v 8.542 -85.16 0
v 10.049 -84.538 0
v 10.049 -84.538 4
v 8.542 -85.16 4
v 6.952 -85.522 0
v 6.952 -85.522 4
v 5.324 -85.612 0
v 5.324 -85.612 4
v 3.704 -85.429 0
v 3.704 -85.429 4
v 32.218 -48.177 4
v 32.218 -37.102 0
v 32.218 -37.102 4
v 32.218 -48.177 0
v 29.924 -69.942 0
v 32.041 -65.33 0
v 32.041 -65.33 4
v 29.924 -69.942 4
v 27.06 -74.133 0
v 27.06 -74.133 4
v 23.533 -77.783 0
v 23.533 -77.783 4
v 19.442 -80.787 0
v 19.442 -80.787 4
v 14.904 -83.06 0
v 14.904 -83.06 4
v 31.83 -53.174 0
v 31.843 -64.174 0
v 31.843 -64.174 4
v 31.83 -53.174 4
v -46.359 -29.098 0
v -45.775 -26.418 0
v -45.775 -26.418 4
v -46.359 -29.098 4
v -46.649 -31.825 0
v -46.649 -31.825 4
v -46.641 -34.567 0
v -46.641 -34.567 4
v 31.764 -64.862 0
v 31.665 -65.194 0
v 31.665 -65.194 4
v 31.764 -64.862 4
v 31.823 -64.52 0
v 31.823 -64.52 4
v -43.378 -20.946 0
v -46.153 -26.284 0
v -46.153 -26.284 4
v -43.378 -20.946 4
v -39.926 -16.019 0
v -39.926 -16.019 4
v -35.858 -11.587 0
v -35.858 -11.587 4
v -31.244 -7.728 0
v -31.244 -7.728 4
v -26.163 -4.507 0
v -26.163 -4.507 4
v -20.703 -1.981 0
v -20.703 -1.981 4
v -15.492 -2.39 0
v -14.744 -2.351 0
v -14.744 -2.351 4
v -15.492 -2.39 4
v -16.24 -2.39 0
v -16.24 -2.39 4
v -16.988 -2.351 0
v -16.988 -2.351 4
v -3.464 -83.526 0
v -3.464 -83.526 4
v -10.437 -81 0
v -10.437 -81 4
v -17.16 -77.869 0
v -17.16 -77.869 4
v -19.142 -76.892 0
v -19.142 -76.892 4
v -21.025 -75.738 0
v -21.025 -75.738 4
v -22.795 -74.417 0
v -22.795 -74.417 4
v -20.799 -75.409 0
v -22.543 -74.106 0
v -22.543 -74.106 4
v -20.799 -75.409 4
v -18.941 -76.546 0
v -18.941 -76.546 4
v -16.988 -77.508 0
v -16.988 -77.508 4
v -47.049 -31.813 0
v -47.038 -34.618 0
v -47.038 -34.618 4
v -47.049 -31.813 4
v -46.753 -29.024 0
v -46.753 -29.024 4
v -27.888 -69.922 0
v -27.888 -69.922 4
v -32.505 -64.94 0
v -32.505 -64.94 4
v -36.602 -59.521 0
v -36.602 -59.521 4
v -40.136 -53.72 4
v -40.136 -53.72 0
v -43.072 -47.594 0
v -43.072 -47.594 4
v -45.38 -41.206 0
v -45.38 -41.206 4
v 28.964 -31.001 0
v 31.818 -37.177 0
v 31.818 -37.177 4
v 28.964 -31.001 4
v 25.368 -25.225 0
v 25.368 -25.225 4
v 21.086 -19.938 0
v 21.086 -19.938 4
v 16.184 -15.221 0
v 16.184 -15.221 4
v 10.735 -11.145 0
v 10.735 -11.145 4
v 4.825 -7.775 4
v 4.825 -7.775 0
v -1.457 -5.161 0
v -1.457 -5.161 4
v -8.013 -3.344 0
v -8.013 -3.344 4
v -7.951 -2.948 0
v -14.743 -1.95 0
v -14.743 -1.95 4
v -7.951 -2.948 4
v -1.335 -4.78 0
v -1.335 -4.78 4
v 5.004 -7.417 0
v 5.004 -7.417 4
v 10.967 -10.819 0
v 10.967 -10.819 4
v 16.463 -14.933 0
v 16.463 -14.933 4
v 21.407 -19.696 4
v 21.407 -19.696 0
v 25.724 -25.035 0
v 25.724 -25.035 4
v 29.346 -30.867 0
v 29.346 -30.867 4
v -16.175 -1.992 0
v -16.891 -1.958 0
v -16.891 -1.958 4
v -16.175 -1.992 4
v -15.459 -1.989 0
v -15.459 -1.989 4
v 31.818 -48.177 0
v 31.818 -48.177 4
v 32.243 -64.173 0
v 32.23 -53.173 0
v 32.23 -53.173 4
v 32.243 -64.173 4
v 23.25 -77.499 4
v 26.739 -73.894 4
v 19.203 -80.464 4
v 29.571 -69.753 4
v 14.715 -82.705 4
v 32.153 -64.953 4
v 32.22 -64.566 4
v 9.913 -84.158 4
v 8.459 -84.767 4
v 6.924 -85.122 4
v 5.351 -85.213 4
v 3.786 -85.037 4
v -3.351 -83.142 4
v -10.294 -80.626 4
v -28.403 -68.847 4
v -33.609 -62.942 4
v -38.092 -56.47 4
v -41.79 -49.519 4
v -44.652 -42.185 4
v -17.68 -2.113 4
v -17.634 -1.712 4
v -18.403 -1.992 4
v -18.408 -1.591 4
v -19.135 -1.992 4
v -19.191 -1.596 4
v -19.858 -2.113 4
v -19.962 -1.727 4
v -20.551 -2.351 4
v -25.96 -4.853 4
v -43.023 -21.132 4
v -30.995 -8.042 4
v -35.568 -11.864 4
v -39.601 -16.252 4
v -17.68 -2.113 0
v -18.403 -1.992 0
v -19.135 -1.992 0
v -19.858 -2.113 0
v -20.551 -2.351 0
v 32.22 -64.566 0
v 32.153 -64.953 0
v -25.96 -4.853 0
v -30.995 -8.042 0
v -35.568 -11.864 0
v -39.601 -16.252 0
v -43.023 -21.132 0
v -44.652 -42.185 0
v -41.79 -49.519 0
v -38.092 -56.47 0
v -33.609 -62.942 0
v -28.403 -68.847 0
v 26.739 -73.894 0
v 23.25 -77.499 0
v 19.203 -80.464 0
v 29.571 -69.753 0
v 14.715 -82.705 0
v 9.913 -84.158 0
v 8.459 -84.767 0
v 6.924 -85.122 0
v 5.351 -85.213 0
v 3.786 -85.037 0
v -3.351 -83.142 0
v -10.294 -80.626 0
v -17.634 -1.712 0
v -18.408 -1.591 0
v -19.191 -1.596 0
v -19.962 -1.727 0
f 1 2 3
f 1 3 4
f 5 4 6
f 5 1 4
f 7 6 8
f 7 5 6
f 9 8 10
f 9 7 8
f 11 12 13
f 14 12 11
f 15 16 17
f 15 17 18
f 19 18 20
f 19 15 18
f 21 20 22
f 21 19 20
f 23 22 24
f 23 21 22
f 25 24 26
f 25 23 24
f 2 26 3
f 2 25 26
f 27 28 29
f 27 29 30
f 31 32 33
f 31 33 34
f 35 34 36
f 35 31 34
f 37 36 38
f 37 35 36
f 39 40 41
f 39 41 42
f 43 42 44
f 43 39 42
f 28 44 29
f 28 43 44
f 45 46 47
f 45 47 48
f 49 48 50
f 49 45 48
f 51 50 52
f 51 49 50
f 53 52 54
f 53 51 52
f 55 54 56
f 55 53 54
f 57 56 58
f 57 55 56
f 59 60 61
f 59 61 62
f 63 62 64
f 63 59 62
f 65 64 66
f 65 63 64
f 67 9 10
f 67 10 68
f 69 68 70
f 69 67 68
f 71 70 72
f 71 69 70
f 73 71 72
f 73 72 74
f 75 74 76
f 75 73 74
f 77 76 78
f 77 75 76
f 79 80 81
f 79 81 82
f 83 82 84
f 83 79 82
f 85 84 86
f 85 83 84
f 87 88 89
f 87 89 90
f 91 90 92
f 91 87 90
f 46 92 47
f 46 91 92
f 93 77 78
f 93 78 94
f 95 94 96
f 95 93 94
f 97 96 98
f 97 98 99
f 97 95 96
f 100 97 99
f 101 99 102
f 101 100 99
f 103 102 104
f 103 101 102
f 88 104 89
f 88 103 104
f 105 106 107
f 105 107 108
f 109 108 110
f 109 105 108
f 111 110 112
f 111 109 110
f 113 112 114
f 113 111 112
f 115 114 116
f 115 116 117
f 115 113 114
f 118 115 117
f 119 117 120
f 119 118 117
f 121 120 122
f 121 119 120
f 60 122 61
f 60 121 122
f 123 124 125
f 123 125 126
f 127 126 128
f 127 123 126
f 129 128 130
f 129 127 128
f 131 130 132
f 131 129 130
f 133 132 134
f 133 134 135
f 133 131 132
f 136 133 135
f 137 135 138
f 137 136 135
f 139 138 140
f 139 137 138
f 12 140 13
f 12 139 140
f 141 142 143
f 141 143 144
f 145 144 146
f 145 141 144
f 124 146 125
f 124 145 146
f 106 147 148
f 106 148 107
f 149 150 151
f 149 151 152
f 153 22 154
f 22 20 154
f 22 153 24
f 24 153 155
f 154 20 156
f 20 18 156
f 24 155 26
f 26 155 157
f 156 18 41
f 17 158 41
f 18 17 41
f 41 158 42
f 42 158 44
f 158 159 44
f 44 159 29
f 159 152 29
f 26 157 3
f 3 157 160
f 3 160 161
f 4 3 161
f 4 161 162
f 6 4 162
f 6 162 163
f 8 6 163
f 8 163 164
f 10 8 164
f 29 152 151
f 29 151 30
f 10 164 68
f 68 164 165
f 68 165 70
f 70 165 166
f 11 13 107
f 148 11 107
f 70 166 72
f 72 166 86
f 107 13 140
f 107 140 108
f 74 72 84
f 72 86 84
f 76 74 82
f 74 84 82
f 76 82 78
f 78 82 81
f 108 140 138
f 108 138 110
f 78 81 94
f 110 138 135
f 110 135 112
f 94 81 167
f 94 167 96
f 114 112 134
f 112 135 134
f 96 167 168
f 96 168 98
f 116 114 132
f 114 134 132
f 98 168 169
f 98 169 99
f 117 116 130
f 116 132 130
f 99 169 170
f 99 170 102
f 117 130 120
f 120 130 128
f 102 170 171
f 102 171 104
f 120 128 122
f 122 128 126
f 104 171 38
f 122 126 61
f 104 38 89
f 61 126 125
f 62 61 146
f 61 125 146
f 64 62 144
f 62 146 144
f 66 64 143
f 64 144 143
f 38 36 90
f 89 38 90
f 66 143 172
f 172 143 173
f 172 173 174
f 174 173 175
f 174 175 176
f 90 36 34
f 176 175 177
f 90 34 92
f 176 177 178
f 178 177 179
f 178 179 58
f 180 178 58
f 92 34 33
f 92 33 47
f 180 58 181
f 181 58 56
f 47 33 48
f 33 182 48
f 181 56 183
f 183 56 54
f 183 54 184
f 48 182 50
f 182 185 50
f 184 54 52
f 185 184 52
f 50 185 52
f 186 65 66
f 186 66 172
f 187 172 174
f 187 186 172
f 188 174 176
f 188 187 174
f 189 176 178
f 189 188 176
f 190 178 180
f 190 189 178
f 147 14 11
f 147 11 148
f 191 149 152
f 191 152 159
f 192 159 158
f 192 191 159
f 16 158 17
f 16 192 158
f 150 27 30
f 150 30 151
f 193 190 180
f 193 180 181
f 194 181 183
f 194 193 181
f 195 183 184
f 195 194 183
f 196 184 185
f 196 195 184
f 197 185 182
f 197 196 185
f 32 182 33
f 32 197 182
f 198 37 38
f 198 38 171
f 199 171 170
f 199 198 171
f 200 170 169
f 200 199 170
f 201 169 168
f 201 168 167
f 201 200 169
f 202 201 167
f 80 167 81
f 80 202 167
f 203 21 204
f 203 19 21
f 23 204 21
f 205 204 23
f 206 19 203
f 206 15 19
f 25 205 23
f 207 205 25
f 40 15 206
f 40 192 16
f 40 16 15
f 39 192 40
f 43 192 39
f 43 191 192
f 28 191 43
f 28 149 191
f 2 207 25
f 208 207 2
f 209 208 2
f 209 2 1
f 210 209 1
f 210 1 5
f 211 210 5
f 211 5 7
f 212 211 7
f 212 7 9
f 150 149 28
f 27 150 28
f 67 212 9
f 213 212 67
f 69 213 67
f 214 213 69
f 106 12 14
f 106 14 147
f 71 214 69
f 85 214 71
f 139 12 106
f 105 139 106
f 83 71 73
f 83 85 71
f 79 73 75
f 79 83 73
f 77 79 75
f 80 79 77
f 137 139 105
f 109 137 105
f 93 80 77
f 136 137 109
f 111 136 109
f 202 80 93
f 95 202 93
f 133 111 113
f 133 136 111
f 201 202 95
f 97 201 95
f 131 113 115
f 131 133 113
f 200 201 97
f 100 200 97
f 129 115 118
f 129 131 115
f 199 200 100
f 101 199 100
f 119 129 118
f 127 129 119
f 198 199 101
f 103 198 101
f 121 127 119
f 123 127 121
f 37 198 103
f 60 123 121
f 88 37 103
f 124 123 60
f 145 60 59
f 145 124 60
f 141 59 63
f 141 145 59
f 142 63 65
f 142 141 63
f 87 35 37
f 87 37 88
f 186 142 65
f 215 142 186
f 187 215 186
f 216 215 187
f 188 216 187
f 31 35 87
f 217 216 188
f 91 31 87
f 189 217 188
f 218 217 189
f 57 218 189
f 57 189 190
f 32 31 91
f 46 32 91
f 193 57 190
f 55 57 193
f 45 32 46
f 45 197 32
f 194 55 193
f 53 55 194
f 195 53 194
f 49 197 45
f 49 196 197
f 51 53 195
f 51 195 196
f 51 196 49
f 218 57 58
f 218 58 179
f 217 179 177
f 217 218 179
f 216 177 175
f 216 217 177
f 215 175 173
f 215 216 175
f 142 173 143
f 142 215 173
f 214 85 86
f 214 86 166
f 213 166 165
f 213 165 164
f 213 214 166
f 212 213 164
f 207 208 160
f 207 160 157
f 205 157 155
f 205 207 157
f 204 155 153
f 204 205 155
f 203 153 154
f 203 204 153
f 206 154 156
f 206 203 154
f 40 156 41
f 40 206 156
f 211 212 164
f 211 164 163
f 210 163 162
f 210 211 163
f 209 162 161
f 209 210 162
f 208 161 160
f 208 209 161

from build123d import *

# Parameters (mm, degrees)
EXTRUDE_1_DEPTH = 4


with BuildPart() as part:
    # ｽｹｯﾁ1 → 押し出し-薄板1 (new body)
    with BuildSketch(Plane.XY):
        with BuildLine():
            Line((31.817918932, -48.177333301), (31.817918932, -37.177333301))
            ThreePointArc((31.817918932, -37.177333301), (13.522512959, -13.098535642), (-14.744222733, -2.35134858))
            ThreePointArc((-14.744222733, -2.35134858), (-15.865863397, -2.395137502), (-16.987504061, -2.35134858))
            ThreePointArc((-16.987504061, -2.35134858), (-18.769087239, -1.977100594), (-20.550670416, -2.35134858))
            ThreePointArc((-20.550670416, -2.35134858), (-35.568393968, -11.863545081), (-45.774892731, -26.418313577))
            ThreePointArc((-45.774892731, -26.418313577), (-46.541356838, -30.457424603), (-46.640707903, -34.567414199))
            ThreePointArc((-46.640707903, -34.567414199), (-38.091787933, -56.469515549), (-22.543394241, -74.105658262))
            ThreePointArc((-22.543394241, -74.105658262), (-19.883130575, -75.998799448), (-16.987504061, -77.507551719))
            ThreePointArc((-16.987504061, -77.507551719), (-6.850461885, -81.960889249), (3.785718261, -85.037171284))
            ThreePointArc((3.785718261, -85.037171284), (6.924298505, -85.121668583), (9.912563229, -84.158289278))
            ThreePointArc((9.912563229, -84.158289278), (23.249791669, -77.499086362), (31.664980135, -65.194158528))
            ThreePointArc((31.664980135, -65.194158528), (31.798207183, -64.69156991), (31.842654494, -64.173526282))
            Line((31.842654494, -64.173526282), (31.829698084, -53.173533912))
            Line((31.829698084, -53.173533912), (32.229697806, -53.17306277))
            Line((32.229697806, -53.17306277), (32.242654217, -64.17305514))
            ThreePointArc((32.242654217, -64.17305514), (32.192280597, -64.760171252), (32.041289943, -65.329771685))
            ThreePointArc((32.041289943, -65.329771685), (23.533127113, -77.782723155), (10.048772084, -84.538239753))
            ThreePointArc((10.048772084, -84.538239753), (6.951896278, -85.521759001), (3.703928148, -85.428738073))
            ThreePointArc((3.703928148, -85.428738073), (-6.978540006, -82.339930506), (-17.160076645, -77.868670088))
            ThreePointArc((-17.160076645, -77.868670088), (-20.096654101, -76.337084696), (-22.795002474, -74.416627193))
            ThreePointArc((-22.795002474, -74.416627193), (-38.441353007, -56.664552527), (-47.038422063, -34.618354588))
            ThreePointArc((-47.038422063, -34.618354588), (-46.939059251, -30.414609925), (-46.152726889, -26.283868638))
            ThreePointArc((-46.152726889, -26.283868638), (-35.858331906, -11.587325271), (-20.702879093, -1.981326883))
            ThreePointArc((-20.702879093, -1.981326883), (-18.799199915, -1.577194509), (-16.890627411, -1.957547479))
            ThreePointArc((-16.890627411, -1.957547479), (-15.816780094, -1.995051381), (-14.743222437, -1.950011819))
            ThreePointArc((-14.743222437, -1.950011819), (13.7790296, -12.790893821), (32.217918932, -37.10243314))
            Line((32.217918932, -37.10243314), (32.217918932, -48.177333301))
            Line((32.217918932, -48.177333301), (31.817918932, -48.177333301))
        make_face()
    extrude(amount=EXTRUDE_1_DEPTH)


solid = part.part
